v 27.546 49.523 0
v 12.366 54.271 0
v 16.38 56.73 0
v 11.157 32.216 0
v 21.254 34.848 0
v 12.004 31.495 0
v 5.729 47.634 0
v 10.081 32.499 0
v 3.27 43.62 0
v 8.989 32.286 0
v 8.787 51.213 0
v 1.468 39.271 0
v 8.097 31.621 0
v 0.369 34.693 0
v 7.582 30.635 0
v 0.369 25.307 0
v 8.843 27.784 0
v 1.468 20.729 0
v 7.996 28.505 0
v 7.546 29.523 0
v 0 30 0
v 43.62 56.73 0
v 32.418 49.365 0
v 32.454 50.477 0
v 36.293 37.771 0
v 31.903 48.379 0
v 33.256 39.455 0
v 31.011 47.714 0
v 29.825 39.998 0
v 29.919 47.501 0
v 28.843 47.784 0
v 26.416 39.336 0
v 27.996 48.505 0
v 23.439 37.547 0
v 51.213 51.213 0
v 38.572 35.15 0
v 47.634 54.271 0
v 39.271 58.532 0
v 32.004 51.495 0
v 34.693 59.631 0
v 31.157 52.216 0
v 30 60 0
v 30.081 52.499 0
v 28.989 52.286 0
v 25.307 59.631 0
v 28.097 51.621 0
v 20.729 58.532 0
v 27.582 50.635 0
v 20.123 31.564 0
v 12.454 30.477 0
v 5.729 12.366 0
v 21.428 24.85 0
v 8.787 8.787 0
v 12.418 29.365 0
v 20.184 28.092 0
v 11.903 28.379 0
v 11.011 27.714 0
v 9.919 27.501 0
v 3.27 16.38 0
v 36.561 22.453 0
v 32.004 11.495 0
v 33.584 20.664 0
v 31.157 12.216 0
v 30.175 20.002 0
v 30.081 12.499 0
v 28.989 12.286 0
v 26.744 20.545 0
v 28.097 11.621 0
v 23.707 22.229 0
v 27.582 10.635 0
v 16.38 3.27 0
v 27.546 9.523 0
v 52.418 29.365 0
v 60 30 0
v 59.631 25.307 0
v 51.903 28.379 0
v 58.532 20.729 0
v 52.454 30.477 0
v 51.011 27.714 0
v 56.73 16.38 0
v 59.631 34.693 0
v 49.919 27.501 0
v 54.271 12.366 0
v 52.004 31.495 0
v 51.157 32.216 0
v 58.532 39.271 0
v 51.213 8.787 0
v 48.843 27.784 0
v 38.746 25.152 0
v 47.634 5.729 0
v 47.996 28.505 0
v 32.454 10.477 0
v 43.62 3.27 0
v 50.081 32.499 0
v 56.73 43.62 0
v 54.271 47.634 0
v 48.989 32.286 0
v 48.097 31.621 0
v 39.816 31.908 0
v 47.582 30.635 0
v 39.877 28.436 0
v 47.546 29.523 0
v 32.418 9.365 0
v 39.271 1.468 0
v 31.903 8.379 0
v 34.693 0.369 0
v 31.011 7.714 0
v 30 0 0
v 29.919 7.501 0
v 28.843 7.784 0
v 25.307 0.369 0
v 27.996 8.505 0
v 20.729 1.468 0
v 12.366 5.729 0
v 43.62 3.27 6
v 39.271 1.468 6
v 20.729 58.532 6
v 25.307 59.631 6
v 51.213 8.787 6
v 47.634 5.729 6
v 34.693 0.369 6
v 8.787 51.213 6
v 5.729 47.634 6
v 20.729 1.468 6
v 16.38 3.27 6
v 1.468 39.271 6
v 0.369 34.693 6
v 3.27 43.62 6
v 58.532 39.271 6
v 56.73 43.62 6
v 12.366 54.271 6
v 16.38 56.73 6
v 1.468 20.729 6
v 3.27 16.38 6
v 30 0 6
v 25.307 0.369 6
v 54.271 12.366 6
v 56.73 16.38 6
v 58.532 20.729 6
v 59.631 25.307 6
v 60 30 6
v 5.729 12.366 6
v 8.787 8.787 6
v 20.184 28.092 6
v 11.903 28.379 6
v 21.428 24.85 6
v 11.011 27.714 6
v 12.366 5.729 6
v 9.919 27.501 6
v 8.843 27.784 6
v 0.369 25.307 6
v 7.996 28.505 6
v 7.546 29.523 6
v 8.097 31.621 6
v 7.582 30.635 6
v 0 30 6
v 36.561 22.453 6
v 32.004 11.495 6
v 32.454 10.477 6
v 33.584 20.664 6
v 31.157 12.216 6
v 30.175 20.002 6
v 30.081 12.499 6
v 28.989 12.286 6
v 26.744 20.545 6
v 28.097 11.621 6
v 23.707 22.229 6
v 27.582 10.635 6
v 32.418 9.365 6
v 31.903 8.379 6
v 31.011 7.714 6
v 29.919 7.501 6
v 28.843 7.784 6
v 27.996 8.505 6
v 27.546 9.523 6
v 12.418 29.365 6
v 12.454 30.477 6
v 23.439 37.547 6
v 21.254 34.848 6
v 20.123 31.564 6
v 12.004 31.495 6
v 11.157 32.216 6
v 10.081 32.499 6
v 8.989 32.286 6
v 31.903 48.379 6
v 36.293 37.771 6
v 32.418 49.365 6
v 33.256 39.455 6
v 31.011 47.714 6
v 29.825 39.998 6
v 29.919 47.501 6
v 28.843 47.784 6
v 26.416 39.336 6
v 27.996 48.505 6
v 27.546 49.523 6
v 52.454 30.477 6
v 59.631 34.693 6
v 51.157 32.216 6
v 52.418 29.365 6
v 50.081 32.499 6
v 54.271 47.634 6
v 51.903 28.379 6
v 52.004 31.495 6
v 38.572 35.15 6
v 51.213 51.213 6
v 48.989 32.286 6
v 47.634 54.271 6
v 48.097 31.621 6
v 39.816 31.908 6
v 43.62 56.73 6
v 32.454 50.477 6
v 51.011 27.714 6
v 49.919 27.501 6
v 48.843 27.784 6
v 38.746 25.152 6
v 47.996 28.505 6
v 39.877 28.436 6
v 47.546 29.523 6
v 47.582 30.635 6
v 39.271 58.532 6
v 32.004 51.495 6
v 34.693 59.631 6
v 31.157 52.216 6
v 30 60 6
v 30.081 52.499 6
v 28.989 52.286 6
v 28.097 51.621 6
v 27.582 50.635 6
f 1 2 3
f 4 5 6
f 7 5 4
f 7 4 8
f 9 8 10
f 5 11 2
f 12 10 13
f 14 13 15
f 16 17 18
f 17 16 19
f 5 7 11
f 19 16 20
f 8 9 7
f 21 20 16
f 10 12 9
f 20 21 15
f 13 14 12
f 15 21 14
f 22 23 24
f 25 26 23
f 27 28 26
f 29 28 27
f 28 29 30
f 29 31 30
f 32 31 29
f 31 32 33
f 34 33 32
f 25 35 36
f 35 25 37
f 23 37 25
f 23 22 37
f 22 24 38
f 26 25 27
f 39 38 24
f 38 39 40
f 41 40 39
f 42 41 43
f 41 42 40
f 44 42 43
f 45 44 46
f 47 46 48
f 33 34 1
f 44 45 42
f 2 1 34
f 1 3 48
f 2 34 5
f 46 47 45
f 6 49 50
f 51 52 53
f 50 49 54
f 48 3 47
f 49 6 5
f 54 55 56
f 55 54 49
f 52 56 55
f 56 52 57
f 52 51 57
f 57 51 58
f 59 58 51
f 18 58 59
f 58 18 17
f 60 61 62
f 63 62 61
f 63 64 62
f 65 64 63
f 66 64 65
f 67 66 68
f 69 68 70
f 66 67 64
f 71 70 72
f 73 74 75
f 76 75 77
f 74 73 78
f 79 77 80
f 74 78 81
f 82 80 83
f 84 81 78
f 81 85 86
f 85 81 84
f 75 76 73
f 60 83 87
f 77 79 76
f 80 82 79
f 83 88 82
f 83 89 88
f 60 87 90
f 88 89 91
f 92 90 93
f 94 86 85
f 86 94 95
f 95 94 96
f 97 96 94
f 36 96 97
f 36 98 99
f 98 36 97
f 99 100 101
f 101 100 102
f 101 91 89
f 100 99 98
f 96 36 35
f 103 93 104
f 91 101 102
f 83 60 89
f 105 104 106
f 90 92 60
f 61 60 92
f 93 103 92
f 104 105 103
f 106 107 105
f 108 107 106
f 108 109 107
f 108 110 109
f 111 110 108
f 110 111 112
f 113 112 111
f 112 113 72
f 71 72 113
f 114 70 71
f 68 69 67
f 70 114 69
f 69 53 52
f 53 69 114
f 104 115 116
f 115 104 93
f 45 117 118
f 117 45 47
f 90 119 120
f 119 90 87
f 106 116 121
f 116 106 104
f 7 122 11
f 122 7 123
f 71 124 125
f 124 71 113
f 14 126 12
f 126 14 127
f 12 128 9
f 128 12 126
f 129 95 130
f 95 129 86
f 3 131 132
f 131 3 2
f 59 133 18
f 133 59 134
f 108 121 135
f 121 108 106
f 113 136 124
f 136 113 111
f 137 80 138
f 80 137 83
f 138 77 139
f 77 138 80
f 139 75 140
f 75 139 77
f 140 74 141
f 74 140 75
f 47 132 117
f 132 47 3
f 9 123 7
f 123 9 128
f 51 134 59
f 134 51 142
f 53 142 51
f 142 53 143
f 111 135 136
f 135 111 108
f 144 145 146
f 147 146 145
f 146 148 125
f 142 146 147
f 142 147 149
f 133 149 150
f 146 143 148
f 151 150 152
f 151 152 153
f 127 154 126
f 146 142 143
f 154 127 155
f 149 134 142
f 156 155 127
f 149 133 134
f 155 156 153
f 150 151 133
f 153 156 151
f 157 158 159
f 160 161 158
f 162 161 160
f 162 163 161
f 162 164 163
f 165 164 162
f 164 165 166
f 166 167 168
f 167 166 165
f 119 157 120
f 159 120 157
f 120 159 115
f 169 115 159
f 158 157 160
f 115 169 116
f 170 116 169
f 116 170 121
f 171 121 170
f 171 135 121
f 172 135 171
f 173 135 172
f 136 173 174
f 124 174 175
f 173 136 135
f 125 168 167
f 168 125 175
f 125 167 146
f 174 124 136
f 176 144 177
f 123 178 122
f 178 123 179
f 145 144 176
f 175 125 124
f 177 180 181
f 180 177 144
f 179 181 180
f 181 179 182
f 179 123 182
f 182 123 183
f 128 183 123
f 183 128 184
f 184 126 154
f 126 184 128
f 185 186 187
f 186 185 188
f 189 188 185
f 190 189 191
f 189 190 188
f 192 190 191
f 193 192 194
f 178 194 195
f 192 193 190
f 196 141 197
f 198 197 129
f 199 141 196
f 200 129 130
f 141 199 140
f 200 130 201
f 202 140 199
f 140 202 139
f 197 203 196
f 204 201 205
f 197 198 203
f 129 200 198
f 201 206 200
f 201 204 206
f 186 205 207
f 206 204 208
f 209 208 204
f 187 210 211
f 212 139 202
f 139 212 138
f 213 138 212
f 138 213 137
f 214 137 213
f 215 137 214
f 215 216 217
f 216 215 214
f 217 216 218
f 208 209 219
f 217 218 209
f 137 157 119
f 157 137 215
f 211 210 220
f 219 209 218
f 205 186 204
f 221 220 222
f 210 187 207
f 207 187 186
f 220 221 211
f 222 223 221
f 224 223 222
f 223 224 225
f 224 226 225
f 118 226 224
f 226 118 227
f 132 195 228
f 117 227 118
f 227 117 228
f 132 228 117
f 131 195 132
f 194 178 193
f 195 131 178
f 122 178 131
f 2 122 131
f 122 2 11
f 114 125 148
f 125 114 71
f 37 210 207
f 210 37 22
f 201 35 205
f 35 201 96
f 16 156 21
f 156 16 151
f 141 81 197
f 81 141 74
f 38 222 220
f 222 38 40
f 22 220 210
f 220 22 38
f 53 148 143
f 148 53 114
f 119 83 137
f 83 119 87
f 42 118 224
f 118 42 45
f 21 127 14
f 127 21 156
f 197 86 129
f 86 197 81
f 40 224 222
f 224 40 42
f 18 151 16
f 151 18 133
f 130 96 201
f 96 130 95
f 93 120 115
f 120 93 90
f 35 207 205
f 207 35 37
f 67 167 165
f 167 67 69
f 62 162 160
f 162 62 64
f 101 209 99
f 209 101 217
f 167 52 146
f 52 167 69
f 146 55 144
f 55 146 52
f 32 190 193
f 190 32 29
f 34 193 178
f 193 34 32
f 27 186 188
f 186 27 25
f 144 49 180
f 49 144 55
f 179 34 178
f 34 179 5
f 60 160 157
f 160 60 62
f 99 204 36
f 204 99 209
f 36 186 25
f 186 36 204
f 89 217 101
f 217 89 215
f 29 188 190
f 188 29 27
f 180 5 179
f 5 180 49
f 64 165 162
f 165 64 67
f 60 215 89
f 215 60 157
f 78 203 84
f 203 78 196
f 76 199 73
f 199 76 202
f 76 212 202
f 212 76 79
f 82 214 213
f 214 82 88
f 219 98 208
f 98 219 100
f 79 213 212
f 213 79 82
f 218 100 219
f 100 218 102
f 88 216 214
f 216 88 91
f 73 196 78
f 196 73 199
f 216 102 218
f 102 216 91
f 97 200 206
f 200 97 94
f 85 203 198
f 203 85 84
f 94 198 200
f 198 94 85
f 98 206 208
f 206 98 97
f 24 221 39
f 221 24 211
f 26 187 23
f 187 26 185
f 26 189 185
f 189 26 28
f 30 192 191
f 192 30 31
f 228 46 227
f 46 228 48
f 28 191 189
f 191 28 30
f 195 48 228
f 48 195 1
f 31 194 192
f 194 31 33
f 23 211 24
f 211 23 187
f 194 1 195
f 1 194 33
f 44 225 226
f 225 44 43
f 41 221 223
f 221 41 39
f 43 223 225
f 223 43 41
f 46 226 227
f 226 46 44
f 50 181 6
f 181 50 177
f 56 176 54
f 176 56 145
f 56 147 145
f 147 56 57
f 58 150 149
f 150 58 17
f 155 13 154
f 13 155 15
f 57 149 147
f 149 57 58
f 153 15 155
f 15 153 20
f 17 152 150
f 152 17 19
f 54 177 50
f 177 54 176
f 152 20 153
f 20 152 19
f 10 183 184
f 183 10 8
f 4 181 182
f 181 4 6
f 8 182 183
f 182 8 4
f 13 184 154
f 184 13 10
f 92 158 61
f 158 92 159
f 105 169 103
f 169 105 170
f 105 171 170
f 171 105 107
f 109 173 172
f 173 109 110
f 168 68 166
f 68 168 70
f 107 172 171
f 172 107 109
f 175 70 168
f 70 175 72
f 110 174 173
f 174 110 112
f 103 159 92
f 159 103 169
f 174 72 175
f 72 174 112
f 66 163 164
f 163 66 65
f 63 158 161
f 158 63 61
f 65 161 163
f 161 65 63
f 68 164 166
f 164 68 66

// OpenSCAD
$fn = 32;

// ----------------------------------------------------------------------
// Spacer plate: round flange R30, 4 bolts
// ----------------------------------------------------------------------

// --- parameters (mm) ---
bore_r = 10;              // centre bore radius
bolt_r = 2.5;             // bolt hole radius
plate_t = 6;              // plate thickness, Z (extrusion height)
flange_r = 30;            // flange radius
n_bolt = 4;               // bolt hole count
ring_r = 20;              // bolt circle radius
fit_tol = 0.1;            // declared fit tolerance (prompt contract)
free_tol = 0.5;           // declared free tolerance (prompt contract)

profile = [[60, 30], [59.631, 34.693], [58.532, 39.271], [56.73, 43.62], [54.271, 47.634], [51.213, 51.213], [47.634, 54.271], [43.62, 56.73], [39.271, 58.532], [34.693, 59.631], [30, 60], [25.307, 59.631], [20.729, 58.532], [16.38, 56.73], [12.366, 54.271], [8.787, 51.213], [5.729, 47.634], [3.27, 43.62], [1.468, 39.271], [0.369, 34.693], [0, 30], [0.369, 25.307], [1.468, 20.729], [3.27, 16.38], [5.729, 12.366], [8.787, 8.787], [12.366, 5.729], [16.38, 3.27], [20.729, 1.468], [25.307, 0.369], [30, 0], [34.693, 0.369], [39.271, 1.468], [43.62, 3.27], [47.634, 5.729], [51.213, 8.787], [54.271, 12.366], [56.73, 16.38], [58.532, 20.729], [59.631, 25.307]];  // primary outline, 40 points, counter clockwise
void_1 = [[39.816, 31.908], [38.572, 35.15], [36.293, 37.771], [33.256, 39.455], [29.825, 39.998], [26.416, 39.336], [23.439, 37.547], [21.254, 34.848], [20.123, 31.564], [20.184, 28.092], [21.428, 24.85], [23.707, 22.229], [26.744, 20.545], [30.175, 20.002], [33.584, 20.664], [36.561, 22.453], [38.746, 25.152], [39.877, 28.436]];  // centre bore, 18 points
void_2 = [[52.454, 30.477], [52.004, 31.495], [51.157, 32.216], [50.081, 32.499], [48.989, 32.286], [48.097, 31.621], [47.582, 30.635], [47.546, 29.523], [47.996, 28.505], [48.843, 27.784], [49.919, 27.501], [51.011, 27.714], [51.903, 28.379], [52.418, 29.365]];  // bolt hole 1, 14 points
void_3 = [[32.454, 50.477], [32.004, 51.495], [31.157, 52.216], [30.081, 52.499], [28.989, 52.286], [28.097, 51.621], [27.582, 50.635], [27.546, 49.523], [27.996, 48.505], [28.843, 47.784], [29.919, 47.501], [31.011, 47.714], [31.903, 48.379], [32.418, 49.365]];  // bolt hole 2, 14 points
void_4 = [[12.454, 30.477], [12.004, 31.495], [11.157, 32.216], [10.081, 32.499], [8.989, 32.286], [8.097, 31.621], [7.582, 30.635], [7.546, 29.523], [7.996, 28.505], [8.843, 27.784], [9.919, 27.501], [11.011, 27.714], [11.903, 28.379], [12.418, 29.365]];  // bolt hole 3, 14 points
void_5 = [[32.454, 10.477], [32.004, 11.495], [31.157, 12.216], [30.081, 12.499], [28.989, 12.286], [28.097, 11.621], [27.582, 10.635], [27.546, 9.523], [27.996, 8.505], [28.843, 7.784], [29.919, 7.501], [31.011, 7.714], [31.903, 8.379], [32.418, 9.365]];  // bolt hole 4, 14 points

// --- the one profile operation ---
difference() {
  linear_extrude(height = plate_t) polygon(points = profile);
  translate([0, 0, -1])
    linear_extrude(height = plate_t + 2) polygon(points = void_1);
  translate([0, 0, -1])
    linear_extrude(height = plate_t + 2) polygon(points = void_2);
  translate([0, 0, -1])
    linear_extrude(height = plate_t + 2) polygon(points = void_3);
  translate([0, 0, -1])
    linear_extrude(height = plate_t + 2) polygon(points = void_4);
  translate([0, 0, -1])
    linear_extrude(height = plate_t + 2) polygon(points = void_5);
}
